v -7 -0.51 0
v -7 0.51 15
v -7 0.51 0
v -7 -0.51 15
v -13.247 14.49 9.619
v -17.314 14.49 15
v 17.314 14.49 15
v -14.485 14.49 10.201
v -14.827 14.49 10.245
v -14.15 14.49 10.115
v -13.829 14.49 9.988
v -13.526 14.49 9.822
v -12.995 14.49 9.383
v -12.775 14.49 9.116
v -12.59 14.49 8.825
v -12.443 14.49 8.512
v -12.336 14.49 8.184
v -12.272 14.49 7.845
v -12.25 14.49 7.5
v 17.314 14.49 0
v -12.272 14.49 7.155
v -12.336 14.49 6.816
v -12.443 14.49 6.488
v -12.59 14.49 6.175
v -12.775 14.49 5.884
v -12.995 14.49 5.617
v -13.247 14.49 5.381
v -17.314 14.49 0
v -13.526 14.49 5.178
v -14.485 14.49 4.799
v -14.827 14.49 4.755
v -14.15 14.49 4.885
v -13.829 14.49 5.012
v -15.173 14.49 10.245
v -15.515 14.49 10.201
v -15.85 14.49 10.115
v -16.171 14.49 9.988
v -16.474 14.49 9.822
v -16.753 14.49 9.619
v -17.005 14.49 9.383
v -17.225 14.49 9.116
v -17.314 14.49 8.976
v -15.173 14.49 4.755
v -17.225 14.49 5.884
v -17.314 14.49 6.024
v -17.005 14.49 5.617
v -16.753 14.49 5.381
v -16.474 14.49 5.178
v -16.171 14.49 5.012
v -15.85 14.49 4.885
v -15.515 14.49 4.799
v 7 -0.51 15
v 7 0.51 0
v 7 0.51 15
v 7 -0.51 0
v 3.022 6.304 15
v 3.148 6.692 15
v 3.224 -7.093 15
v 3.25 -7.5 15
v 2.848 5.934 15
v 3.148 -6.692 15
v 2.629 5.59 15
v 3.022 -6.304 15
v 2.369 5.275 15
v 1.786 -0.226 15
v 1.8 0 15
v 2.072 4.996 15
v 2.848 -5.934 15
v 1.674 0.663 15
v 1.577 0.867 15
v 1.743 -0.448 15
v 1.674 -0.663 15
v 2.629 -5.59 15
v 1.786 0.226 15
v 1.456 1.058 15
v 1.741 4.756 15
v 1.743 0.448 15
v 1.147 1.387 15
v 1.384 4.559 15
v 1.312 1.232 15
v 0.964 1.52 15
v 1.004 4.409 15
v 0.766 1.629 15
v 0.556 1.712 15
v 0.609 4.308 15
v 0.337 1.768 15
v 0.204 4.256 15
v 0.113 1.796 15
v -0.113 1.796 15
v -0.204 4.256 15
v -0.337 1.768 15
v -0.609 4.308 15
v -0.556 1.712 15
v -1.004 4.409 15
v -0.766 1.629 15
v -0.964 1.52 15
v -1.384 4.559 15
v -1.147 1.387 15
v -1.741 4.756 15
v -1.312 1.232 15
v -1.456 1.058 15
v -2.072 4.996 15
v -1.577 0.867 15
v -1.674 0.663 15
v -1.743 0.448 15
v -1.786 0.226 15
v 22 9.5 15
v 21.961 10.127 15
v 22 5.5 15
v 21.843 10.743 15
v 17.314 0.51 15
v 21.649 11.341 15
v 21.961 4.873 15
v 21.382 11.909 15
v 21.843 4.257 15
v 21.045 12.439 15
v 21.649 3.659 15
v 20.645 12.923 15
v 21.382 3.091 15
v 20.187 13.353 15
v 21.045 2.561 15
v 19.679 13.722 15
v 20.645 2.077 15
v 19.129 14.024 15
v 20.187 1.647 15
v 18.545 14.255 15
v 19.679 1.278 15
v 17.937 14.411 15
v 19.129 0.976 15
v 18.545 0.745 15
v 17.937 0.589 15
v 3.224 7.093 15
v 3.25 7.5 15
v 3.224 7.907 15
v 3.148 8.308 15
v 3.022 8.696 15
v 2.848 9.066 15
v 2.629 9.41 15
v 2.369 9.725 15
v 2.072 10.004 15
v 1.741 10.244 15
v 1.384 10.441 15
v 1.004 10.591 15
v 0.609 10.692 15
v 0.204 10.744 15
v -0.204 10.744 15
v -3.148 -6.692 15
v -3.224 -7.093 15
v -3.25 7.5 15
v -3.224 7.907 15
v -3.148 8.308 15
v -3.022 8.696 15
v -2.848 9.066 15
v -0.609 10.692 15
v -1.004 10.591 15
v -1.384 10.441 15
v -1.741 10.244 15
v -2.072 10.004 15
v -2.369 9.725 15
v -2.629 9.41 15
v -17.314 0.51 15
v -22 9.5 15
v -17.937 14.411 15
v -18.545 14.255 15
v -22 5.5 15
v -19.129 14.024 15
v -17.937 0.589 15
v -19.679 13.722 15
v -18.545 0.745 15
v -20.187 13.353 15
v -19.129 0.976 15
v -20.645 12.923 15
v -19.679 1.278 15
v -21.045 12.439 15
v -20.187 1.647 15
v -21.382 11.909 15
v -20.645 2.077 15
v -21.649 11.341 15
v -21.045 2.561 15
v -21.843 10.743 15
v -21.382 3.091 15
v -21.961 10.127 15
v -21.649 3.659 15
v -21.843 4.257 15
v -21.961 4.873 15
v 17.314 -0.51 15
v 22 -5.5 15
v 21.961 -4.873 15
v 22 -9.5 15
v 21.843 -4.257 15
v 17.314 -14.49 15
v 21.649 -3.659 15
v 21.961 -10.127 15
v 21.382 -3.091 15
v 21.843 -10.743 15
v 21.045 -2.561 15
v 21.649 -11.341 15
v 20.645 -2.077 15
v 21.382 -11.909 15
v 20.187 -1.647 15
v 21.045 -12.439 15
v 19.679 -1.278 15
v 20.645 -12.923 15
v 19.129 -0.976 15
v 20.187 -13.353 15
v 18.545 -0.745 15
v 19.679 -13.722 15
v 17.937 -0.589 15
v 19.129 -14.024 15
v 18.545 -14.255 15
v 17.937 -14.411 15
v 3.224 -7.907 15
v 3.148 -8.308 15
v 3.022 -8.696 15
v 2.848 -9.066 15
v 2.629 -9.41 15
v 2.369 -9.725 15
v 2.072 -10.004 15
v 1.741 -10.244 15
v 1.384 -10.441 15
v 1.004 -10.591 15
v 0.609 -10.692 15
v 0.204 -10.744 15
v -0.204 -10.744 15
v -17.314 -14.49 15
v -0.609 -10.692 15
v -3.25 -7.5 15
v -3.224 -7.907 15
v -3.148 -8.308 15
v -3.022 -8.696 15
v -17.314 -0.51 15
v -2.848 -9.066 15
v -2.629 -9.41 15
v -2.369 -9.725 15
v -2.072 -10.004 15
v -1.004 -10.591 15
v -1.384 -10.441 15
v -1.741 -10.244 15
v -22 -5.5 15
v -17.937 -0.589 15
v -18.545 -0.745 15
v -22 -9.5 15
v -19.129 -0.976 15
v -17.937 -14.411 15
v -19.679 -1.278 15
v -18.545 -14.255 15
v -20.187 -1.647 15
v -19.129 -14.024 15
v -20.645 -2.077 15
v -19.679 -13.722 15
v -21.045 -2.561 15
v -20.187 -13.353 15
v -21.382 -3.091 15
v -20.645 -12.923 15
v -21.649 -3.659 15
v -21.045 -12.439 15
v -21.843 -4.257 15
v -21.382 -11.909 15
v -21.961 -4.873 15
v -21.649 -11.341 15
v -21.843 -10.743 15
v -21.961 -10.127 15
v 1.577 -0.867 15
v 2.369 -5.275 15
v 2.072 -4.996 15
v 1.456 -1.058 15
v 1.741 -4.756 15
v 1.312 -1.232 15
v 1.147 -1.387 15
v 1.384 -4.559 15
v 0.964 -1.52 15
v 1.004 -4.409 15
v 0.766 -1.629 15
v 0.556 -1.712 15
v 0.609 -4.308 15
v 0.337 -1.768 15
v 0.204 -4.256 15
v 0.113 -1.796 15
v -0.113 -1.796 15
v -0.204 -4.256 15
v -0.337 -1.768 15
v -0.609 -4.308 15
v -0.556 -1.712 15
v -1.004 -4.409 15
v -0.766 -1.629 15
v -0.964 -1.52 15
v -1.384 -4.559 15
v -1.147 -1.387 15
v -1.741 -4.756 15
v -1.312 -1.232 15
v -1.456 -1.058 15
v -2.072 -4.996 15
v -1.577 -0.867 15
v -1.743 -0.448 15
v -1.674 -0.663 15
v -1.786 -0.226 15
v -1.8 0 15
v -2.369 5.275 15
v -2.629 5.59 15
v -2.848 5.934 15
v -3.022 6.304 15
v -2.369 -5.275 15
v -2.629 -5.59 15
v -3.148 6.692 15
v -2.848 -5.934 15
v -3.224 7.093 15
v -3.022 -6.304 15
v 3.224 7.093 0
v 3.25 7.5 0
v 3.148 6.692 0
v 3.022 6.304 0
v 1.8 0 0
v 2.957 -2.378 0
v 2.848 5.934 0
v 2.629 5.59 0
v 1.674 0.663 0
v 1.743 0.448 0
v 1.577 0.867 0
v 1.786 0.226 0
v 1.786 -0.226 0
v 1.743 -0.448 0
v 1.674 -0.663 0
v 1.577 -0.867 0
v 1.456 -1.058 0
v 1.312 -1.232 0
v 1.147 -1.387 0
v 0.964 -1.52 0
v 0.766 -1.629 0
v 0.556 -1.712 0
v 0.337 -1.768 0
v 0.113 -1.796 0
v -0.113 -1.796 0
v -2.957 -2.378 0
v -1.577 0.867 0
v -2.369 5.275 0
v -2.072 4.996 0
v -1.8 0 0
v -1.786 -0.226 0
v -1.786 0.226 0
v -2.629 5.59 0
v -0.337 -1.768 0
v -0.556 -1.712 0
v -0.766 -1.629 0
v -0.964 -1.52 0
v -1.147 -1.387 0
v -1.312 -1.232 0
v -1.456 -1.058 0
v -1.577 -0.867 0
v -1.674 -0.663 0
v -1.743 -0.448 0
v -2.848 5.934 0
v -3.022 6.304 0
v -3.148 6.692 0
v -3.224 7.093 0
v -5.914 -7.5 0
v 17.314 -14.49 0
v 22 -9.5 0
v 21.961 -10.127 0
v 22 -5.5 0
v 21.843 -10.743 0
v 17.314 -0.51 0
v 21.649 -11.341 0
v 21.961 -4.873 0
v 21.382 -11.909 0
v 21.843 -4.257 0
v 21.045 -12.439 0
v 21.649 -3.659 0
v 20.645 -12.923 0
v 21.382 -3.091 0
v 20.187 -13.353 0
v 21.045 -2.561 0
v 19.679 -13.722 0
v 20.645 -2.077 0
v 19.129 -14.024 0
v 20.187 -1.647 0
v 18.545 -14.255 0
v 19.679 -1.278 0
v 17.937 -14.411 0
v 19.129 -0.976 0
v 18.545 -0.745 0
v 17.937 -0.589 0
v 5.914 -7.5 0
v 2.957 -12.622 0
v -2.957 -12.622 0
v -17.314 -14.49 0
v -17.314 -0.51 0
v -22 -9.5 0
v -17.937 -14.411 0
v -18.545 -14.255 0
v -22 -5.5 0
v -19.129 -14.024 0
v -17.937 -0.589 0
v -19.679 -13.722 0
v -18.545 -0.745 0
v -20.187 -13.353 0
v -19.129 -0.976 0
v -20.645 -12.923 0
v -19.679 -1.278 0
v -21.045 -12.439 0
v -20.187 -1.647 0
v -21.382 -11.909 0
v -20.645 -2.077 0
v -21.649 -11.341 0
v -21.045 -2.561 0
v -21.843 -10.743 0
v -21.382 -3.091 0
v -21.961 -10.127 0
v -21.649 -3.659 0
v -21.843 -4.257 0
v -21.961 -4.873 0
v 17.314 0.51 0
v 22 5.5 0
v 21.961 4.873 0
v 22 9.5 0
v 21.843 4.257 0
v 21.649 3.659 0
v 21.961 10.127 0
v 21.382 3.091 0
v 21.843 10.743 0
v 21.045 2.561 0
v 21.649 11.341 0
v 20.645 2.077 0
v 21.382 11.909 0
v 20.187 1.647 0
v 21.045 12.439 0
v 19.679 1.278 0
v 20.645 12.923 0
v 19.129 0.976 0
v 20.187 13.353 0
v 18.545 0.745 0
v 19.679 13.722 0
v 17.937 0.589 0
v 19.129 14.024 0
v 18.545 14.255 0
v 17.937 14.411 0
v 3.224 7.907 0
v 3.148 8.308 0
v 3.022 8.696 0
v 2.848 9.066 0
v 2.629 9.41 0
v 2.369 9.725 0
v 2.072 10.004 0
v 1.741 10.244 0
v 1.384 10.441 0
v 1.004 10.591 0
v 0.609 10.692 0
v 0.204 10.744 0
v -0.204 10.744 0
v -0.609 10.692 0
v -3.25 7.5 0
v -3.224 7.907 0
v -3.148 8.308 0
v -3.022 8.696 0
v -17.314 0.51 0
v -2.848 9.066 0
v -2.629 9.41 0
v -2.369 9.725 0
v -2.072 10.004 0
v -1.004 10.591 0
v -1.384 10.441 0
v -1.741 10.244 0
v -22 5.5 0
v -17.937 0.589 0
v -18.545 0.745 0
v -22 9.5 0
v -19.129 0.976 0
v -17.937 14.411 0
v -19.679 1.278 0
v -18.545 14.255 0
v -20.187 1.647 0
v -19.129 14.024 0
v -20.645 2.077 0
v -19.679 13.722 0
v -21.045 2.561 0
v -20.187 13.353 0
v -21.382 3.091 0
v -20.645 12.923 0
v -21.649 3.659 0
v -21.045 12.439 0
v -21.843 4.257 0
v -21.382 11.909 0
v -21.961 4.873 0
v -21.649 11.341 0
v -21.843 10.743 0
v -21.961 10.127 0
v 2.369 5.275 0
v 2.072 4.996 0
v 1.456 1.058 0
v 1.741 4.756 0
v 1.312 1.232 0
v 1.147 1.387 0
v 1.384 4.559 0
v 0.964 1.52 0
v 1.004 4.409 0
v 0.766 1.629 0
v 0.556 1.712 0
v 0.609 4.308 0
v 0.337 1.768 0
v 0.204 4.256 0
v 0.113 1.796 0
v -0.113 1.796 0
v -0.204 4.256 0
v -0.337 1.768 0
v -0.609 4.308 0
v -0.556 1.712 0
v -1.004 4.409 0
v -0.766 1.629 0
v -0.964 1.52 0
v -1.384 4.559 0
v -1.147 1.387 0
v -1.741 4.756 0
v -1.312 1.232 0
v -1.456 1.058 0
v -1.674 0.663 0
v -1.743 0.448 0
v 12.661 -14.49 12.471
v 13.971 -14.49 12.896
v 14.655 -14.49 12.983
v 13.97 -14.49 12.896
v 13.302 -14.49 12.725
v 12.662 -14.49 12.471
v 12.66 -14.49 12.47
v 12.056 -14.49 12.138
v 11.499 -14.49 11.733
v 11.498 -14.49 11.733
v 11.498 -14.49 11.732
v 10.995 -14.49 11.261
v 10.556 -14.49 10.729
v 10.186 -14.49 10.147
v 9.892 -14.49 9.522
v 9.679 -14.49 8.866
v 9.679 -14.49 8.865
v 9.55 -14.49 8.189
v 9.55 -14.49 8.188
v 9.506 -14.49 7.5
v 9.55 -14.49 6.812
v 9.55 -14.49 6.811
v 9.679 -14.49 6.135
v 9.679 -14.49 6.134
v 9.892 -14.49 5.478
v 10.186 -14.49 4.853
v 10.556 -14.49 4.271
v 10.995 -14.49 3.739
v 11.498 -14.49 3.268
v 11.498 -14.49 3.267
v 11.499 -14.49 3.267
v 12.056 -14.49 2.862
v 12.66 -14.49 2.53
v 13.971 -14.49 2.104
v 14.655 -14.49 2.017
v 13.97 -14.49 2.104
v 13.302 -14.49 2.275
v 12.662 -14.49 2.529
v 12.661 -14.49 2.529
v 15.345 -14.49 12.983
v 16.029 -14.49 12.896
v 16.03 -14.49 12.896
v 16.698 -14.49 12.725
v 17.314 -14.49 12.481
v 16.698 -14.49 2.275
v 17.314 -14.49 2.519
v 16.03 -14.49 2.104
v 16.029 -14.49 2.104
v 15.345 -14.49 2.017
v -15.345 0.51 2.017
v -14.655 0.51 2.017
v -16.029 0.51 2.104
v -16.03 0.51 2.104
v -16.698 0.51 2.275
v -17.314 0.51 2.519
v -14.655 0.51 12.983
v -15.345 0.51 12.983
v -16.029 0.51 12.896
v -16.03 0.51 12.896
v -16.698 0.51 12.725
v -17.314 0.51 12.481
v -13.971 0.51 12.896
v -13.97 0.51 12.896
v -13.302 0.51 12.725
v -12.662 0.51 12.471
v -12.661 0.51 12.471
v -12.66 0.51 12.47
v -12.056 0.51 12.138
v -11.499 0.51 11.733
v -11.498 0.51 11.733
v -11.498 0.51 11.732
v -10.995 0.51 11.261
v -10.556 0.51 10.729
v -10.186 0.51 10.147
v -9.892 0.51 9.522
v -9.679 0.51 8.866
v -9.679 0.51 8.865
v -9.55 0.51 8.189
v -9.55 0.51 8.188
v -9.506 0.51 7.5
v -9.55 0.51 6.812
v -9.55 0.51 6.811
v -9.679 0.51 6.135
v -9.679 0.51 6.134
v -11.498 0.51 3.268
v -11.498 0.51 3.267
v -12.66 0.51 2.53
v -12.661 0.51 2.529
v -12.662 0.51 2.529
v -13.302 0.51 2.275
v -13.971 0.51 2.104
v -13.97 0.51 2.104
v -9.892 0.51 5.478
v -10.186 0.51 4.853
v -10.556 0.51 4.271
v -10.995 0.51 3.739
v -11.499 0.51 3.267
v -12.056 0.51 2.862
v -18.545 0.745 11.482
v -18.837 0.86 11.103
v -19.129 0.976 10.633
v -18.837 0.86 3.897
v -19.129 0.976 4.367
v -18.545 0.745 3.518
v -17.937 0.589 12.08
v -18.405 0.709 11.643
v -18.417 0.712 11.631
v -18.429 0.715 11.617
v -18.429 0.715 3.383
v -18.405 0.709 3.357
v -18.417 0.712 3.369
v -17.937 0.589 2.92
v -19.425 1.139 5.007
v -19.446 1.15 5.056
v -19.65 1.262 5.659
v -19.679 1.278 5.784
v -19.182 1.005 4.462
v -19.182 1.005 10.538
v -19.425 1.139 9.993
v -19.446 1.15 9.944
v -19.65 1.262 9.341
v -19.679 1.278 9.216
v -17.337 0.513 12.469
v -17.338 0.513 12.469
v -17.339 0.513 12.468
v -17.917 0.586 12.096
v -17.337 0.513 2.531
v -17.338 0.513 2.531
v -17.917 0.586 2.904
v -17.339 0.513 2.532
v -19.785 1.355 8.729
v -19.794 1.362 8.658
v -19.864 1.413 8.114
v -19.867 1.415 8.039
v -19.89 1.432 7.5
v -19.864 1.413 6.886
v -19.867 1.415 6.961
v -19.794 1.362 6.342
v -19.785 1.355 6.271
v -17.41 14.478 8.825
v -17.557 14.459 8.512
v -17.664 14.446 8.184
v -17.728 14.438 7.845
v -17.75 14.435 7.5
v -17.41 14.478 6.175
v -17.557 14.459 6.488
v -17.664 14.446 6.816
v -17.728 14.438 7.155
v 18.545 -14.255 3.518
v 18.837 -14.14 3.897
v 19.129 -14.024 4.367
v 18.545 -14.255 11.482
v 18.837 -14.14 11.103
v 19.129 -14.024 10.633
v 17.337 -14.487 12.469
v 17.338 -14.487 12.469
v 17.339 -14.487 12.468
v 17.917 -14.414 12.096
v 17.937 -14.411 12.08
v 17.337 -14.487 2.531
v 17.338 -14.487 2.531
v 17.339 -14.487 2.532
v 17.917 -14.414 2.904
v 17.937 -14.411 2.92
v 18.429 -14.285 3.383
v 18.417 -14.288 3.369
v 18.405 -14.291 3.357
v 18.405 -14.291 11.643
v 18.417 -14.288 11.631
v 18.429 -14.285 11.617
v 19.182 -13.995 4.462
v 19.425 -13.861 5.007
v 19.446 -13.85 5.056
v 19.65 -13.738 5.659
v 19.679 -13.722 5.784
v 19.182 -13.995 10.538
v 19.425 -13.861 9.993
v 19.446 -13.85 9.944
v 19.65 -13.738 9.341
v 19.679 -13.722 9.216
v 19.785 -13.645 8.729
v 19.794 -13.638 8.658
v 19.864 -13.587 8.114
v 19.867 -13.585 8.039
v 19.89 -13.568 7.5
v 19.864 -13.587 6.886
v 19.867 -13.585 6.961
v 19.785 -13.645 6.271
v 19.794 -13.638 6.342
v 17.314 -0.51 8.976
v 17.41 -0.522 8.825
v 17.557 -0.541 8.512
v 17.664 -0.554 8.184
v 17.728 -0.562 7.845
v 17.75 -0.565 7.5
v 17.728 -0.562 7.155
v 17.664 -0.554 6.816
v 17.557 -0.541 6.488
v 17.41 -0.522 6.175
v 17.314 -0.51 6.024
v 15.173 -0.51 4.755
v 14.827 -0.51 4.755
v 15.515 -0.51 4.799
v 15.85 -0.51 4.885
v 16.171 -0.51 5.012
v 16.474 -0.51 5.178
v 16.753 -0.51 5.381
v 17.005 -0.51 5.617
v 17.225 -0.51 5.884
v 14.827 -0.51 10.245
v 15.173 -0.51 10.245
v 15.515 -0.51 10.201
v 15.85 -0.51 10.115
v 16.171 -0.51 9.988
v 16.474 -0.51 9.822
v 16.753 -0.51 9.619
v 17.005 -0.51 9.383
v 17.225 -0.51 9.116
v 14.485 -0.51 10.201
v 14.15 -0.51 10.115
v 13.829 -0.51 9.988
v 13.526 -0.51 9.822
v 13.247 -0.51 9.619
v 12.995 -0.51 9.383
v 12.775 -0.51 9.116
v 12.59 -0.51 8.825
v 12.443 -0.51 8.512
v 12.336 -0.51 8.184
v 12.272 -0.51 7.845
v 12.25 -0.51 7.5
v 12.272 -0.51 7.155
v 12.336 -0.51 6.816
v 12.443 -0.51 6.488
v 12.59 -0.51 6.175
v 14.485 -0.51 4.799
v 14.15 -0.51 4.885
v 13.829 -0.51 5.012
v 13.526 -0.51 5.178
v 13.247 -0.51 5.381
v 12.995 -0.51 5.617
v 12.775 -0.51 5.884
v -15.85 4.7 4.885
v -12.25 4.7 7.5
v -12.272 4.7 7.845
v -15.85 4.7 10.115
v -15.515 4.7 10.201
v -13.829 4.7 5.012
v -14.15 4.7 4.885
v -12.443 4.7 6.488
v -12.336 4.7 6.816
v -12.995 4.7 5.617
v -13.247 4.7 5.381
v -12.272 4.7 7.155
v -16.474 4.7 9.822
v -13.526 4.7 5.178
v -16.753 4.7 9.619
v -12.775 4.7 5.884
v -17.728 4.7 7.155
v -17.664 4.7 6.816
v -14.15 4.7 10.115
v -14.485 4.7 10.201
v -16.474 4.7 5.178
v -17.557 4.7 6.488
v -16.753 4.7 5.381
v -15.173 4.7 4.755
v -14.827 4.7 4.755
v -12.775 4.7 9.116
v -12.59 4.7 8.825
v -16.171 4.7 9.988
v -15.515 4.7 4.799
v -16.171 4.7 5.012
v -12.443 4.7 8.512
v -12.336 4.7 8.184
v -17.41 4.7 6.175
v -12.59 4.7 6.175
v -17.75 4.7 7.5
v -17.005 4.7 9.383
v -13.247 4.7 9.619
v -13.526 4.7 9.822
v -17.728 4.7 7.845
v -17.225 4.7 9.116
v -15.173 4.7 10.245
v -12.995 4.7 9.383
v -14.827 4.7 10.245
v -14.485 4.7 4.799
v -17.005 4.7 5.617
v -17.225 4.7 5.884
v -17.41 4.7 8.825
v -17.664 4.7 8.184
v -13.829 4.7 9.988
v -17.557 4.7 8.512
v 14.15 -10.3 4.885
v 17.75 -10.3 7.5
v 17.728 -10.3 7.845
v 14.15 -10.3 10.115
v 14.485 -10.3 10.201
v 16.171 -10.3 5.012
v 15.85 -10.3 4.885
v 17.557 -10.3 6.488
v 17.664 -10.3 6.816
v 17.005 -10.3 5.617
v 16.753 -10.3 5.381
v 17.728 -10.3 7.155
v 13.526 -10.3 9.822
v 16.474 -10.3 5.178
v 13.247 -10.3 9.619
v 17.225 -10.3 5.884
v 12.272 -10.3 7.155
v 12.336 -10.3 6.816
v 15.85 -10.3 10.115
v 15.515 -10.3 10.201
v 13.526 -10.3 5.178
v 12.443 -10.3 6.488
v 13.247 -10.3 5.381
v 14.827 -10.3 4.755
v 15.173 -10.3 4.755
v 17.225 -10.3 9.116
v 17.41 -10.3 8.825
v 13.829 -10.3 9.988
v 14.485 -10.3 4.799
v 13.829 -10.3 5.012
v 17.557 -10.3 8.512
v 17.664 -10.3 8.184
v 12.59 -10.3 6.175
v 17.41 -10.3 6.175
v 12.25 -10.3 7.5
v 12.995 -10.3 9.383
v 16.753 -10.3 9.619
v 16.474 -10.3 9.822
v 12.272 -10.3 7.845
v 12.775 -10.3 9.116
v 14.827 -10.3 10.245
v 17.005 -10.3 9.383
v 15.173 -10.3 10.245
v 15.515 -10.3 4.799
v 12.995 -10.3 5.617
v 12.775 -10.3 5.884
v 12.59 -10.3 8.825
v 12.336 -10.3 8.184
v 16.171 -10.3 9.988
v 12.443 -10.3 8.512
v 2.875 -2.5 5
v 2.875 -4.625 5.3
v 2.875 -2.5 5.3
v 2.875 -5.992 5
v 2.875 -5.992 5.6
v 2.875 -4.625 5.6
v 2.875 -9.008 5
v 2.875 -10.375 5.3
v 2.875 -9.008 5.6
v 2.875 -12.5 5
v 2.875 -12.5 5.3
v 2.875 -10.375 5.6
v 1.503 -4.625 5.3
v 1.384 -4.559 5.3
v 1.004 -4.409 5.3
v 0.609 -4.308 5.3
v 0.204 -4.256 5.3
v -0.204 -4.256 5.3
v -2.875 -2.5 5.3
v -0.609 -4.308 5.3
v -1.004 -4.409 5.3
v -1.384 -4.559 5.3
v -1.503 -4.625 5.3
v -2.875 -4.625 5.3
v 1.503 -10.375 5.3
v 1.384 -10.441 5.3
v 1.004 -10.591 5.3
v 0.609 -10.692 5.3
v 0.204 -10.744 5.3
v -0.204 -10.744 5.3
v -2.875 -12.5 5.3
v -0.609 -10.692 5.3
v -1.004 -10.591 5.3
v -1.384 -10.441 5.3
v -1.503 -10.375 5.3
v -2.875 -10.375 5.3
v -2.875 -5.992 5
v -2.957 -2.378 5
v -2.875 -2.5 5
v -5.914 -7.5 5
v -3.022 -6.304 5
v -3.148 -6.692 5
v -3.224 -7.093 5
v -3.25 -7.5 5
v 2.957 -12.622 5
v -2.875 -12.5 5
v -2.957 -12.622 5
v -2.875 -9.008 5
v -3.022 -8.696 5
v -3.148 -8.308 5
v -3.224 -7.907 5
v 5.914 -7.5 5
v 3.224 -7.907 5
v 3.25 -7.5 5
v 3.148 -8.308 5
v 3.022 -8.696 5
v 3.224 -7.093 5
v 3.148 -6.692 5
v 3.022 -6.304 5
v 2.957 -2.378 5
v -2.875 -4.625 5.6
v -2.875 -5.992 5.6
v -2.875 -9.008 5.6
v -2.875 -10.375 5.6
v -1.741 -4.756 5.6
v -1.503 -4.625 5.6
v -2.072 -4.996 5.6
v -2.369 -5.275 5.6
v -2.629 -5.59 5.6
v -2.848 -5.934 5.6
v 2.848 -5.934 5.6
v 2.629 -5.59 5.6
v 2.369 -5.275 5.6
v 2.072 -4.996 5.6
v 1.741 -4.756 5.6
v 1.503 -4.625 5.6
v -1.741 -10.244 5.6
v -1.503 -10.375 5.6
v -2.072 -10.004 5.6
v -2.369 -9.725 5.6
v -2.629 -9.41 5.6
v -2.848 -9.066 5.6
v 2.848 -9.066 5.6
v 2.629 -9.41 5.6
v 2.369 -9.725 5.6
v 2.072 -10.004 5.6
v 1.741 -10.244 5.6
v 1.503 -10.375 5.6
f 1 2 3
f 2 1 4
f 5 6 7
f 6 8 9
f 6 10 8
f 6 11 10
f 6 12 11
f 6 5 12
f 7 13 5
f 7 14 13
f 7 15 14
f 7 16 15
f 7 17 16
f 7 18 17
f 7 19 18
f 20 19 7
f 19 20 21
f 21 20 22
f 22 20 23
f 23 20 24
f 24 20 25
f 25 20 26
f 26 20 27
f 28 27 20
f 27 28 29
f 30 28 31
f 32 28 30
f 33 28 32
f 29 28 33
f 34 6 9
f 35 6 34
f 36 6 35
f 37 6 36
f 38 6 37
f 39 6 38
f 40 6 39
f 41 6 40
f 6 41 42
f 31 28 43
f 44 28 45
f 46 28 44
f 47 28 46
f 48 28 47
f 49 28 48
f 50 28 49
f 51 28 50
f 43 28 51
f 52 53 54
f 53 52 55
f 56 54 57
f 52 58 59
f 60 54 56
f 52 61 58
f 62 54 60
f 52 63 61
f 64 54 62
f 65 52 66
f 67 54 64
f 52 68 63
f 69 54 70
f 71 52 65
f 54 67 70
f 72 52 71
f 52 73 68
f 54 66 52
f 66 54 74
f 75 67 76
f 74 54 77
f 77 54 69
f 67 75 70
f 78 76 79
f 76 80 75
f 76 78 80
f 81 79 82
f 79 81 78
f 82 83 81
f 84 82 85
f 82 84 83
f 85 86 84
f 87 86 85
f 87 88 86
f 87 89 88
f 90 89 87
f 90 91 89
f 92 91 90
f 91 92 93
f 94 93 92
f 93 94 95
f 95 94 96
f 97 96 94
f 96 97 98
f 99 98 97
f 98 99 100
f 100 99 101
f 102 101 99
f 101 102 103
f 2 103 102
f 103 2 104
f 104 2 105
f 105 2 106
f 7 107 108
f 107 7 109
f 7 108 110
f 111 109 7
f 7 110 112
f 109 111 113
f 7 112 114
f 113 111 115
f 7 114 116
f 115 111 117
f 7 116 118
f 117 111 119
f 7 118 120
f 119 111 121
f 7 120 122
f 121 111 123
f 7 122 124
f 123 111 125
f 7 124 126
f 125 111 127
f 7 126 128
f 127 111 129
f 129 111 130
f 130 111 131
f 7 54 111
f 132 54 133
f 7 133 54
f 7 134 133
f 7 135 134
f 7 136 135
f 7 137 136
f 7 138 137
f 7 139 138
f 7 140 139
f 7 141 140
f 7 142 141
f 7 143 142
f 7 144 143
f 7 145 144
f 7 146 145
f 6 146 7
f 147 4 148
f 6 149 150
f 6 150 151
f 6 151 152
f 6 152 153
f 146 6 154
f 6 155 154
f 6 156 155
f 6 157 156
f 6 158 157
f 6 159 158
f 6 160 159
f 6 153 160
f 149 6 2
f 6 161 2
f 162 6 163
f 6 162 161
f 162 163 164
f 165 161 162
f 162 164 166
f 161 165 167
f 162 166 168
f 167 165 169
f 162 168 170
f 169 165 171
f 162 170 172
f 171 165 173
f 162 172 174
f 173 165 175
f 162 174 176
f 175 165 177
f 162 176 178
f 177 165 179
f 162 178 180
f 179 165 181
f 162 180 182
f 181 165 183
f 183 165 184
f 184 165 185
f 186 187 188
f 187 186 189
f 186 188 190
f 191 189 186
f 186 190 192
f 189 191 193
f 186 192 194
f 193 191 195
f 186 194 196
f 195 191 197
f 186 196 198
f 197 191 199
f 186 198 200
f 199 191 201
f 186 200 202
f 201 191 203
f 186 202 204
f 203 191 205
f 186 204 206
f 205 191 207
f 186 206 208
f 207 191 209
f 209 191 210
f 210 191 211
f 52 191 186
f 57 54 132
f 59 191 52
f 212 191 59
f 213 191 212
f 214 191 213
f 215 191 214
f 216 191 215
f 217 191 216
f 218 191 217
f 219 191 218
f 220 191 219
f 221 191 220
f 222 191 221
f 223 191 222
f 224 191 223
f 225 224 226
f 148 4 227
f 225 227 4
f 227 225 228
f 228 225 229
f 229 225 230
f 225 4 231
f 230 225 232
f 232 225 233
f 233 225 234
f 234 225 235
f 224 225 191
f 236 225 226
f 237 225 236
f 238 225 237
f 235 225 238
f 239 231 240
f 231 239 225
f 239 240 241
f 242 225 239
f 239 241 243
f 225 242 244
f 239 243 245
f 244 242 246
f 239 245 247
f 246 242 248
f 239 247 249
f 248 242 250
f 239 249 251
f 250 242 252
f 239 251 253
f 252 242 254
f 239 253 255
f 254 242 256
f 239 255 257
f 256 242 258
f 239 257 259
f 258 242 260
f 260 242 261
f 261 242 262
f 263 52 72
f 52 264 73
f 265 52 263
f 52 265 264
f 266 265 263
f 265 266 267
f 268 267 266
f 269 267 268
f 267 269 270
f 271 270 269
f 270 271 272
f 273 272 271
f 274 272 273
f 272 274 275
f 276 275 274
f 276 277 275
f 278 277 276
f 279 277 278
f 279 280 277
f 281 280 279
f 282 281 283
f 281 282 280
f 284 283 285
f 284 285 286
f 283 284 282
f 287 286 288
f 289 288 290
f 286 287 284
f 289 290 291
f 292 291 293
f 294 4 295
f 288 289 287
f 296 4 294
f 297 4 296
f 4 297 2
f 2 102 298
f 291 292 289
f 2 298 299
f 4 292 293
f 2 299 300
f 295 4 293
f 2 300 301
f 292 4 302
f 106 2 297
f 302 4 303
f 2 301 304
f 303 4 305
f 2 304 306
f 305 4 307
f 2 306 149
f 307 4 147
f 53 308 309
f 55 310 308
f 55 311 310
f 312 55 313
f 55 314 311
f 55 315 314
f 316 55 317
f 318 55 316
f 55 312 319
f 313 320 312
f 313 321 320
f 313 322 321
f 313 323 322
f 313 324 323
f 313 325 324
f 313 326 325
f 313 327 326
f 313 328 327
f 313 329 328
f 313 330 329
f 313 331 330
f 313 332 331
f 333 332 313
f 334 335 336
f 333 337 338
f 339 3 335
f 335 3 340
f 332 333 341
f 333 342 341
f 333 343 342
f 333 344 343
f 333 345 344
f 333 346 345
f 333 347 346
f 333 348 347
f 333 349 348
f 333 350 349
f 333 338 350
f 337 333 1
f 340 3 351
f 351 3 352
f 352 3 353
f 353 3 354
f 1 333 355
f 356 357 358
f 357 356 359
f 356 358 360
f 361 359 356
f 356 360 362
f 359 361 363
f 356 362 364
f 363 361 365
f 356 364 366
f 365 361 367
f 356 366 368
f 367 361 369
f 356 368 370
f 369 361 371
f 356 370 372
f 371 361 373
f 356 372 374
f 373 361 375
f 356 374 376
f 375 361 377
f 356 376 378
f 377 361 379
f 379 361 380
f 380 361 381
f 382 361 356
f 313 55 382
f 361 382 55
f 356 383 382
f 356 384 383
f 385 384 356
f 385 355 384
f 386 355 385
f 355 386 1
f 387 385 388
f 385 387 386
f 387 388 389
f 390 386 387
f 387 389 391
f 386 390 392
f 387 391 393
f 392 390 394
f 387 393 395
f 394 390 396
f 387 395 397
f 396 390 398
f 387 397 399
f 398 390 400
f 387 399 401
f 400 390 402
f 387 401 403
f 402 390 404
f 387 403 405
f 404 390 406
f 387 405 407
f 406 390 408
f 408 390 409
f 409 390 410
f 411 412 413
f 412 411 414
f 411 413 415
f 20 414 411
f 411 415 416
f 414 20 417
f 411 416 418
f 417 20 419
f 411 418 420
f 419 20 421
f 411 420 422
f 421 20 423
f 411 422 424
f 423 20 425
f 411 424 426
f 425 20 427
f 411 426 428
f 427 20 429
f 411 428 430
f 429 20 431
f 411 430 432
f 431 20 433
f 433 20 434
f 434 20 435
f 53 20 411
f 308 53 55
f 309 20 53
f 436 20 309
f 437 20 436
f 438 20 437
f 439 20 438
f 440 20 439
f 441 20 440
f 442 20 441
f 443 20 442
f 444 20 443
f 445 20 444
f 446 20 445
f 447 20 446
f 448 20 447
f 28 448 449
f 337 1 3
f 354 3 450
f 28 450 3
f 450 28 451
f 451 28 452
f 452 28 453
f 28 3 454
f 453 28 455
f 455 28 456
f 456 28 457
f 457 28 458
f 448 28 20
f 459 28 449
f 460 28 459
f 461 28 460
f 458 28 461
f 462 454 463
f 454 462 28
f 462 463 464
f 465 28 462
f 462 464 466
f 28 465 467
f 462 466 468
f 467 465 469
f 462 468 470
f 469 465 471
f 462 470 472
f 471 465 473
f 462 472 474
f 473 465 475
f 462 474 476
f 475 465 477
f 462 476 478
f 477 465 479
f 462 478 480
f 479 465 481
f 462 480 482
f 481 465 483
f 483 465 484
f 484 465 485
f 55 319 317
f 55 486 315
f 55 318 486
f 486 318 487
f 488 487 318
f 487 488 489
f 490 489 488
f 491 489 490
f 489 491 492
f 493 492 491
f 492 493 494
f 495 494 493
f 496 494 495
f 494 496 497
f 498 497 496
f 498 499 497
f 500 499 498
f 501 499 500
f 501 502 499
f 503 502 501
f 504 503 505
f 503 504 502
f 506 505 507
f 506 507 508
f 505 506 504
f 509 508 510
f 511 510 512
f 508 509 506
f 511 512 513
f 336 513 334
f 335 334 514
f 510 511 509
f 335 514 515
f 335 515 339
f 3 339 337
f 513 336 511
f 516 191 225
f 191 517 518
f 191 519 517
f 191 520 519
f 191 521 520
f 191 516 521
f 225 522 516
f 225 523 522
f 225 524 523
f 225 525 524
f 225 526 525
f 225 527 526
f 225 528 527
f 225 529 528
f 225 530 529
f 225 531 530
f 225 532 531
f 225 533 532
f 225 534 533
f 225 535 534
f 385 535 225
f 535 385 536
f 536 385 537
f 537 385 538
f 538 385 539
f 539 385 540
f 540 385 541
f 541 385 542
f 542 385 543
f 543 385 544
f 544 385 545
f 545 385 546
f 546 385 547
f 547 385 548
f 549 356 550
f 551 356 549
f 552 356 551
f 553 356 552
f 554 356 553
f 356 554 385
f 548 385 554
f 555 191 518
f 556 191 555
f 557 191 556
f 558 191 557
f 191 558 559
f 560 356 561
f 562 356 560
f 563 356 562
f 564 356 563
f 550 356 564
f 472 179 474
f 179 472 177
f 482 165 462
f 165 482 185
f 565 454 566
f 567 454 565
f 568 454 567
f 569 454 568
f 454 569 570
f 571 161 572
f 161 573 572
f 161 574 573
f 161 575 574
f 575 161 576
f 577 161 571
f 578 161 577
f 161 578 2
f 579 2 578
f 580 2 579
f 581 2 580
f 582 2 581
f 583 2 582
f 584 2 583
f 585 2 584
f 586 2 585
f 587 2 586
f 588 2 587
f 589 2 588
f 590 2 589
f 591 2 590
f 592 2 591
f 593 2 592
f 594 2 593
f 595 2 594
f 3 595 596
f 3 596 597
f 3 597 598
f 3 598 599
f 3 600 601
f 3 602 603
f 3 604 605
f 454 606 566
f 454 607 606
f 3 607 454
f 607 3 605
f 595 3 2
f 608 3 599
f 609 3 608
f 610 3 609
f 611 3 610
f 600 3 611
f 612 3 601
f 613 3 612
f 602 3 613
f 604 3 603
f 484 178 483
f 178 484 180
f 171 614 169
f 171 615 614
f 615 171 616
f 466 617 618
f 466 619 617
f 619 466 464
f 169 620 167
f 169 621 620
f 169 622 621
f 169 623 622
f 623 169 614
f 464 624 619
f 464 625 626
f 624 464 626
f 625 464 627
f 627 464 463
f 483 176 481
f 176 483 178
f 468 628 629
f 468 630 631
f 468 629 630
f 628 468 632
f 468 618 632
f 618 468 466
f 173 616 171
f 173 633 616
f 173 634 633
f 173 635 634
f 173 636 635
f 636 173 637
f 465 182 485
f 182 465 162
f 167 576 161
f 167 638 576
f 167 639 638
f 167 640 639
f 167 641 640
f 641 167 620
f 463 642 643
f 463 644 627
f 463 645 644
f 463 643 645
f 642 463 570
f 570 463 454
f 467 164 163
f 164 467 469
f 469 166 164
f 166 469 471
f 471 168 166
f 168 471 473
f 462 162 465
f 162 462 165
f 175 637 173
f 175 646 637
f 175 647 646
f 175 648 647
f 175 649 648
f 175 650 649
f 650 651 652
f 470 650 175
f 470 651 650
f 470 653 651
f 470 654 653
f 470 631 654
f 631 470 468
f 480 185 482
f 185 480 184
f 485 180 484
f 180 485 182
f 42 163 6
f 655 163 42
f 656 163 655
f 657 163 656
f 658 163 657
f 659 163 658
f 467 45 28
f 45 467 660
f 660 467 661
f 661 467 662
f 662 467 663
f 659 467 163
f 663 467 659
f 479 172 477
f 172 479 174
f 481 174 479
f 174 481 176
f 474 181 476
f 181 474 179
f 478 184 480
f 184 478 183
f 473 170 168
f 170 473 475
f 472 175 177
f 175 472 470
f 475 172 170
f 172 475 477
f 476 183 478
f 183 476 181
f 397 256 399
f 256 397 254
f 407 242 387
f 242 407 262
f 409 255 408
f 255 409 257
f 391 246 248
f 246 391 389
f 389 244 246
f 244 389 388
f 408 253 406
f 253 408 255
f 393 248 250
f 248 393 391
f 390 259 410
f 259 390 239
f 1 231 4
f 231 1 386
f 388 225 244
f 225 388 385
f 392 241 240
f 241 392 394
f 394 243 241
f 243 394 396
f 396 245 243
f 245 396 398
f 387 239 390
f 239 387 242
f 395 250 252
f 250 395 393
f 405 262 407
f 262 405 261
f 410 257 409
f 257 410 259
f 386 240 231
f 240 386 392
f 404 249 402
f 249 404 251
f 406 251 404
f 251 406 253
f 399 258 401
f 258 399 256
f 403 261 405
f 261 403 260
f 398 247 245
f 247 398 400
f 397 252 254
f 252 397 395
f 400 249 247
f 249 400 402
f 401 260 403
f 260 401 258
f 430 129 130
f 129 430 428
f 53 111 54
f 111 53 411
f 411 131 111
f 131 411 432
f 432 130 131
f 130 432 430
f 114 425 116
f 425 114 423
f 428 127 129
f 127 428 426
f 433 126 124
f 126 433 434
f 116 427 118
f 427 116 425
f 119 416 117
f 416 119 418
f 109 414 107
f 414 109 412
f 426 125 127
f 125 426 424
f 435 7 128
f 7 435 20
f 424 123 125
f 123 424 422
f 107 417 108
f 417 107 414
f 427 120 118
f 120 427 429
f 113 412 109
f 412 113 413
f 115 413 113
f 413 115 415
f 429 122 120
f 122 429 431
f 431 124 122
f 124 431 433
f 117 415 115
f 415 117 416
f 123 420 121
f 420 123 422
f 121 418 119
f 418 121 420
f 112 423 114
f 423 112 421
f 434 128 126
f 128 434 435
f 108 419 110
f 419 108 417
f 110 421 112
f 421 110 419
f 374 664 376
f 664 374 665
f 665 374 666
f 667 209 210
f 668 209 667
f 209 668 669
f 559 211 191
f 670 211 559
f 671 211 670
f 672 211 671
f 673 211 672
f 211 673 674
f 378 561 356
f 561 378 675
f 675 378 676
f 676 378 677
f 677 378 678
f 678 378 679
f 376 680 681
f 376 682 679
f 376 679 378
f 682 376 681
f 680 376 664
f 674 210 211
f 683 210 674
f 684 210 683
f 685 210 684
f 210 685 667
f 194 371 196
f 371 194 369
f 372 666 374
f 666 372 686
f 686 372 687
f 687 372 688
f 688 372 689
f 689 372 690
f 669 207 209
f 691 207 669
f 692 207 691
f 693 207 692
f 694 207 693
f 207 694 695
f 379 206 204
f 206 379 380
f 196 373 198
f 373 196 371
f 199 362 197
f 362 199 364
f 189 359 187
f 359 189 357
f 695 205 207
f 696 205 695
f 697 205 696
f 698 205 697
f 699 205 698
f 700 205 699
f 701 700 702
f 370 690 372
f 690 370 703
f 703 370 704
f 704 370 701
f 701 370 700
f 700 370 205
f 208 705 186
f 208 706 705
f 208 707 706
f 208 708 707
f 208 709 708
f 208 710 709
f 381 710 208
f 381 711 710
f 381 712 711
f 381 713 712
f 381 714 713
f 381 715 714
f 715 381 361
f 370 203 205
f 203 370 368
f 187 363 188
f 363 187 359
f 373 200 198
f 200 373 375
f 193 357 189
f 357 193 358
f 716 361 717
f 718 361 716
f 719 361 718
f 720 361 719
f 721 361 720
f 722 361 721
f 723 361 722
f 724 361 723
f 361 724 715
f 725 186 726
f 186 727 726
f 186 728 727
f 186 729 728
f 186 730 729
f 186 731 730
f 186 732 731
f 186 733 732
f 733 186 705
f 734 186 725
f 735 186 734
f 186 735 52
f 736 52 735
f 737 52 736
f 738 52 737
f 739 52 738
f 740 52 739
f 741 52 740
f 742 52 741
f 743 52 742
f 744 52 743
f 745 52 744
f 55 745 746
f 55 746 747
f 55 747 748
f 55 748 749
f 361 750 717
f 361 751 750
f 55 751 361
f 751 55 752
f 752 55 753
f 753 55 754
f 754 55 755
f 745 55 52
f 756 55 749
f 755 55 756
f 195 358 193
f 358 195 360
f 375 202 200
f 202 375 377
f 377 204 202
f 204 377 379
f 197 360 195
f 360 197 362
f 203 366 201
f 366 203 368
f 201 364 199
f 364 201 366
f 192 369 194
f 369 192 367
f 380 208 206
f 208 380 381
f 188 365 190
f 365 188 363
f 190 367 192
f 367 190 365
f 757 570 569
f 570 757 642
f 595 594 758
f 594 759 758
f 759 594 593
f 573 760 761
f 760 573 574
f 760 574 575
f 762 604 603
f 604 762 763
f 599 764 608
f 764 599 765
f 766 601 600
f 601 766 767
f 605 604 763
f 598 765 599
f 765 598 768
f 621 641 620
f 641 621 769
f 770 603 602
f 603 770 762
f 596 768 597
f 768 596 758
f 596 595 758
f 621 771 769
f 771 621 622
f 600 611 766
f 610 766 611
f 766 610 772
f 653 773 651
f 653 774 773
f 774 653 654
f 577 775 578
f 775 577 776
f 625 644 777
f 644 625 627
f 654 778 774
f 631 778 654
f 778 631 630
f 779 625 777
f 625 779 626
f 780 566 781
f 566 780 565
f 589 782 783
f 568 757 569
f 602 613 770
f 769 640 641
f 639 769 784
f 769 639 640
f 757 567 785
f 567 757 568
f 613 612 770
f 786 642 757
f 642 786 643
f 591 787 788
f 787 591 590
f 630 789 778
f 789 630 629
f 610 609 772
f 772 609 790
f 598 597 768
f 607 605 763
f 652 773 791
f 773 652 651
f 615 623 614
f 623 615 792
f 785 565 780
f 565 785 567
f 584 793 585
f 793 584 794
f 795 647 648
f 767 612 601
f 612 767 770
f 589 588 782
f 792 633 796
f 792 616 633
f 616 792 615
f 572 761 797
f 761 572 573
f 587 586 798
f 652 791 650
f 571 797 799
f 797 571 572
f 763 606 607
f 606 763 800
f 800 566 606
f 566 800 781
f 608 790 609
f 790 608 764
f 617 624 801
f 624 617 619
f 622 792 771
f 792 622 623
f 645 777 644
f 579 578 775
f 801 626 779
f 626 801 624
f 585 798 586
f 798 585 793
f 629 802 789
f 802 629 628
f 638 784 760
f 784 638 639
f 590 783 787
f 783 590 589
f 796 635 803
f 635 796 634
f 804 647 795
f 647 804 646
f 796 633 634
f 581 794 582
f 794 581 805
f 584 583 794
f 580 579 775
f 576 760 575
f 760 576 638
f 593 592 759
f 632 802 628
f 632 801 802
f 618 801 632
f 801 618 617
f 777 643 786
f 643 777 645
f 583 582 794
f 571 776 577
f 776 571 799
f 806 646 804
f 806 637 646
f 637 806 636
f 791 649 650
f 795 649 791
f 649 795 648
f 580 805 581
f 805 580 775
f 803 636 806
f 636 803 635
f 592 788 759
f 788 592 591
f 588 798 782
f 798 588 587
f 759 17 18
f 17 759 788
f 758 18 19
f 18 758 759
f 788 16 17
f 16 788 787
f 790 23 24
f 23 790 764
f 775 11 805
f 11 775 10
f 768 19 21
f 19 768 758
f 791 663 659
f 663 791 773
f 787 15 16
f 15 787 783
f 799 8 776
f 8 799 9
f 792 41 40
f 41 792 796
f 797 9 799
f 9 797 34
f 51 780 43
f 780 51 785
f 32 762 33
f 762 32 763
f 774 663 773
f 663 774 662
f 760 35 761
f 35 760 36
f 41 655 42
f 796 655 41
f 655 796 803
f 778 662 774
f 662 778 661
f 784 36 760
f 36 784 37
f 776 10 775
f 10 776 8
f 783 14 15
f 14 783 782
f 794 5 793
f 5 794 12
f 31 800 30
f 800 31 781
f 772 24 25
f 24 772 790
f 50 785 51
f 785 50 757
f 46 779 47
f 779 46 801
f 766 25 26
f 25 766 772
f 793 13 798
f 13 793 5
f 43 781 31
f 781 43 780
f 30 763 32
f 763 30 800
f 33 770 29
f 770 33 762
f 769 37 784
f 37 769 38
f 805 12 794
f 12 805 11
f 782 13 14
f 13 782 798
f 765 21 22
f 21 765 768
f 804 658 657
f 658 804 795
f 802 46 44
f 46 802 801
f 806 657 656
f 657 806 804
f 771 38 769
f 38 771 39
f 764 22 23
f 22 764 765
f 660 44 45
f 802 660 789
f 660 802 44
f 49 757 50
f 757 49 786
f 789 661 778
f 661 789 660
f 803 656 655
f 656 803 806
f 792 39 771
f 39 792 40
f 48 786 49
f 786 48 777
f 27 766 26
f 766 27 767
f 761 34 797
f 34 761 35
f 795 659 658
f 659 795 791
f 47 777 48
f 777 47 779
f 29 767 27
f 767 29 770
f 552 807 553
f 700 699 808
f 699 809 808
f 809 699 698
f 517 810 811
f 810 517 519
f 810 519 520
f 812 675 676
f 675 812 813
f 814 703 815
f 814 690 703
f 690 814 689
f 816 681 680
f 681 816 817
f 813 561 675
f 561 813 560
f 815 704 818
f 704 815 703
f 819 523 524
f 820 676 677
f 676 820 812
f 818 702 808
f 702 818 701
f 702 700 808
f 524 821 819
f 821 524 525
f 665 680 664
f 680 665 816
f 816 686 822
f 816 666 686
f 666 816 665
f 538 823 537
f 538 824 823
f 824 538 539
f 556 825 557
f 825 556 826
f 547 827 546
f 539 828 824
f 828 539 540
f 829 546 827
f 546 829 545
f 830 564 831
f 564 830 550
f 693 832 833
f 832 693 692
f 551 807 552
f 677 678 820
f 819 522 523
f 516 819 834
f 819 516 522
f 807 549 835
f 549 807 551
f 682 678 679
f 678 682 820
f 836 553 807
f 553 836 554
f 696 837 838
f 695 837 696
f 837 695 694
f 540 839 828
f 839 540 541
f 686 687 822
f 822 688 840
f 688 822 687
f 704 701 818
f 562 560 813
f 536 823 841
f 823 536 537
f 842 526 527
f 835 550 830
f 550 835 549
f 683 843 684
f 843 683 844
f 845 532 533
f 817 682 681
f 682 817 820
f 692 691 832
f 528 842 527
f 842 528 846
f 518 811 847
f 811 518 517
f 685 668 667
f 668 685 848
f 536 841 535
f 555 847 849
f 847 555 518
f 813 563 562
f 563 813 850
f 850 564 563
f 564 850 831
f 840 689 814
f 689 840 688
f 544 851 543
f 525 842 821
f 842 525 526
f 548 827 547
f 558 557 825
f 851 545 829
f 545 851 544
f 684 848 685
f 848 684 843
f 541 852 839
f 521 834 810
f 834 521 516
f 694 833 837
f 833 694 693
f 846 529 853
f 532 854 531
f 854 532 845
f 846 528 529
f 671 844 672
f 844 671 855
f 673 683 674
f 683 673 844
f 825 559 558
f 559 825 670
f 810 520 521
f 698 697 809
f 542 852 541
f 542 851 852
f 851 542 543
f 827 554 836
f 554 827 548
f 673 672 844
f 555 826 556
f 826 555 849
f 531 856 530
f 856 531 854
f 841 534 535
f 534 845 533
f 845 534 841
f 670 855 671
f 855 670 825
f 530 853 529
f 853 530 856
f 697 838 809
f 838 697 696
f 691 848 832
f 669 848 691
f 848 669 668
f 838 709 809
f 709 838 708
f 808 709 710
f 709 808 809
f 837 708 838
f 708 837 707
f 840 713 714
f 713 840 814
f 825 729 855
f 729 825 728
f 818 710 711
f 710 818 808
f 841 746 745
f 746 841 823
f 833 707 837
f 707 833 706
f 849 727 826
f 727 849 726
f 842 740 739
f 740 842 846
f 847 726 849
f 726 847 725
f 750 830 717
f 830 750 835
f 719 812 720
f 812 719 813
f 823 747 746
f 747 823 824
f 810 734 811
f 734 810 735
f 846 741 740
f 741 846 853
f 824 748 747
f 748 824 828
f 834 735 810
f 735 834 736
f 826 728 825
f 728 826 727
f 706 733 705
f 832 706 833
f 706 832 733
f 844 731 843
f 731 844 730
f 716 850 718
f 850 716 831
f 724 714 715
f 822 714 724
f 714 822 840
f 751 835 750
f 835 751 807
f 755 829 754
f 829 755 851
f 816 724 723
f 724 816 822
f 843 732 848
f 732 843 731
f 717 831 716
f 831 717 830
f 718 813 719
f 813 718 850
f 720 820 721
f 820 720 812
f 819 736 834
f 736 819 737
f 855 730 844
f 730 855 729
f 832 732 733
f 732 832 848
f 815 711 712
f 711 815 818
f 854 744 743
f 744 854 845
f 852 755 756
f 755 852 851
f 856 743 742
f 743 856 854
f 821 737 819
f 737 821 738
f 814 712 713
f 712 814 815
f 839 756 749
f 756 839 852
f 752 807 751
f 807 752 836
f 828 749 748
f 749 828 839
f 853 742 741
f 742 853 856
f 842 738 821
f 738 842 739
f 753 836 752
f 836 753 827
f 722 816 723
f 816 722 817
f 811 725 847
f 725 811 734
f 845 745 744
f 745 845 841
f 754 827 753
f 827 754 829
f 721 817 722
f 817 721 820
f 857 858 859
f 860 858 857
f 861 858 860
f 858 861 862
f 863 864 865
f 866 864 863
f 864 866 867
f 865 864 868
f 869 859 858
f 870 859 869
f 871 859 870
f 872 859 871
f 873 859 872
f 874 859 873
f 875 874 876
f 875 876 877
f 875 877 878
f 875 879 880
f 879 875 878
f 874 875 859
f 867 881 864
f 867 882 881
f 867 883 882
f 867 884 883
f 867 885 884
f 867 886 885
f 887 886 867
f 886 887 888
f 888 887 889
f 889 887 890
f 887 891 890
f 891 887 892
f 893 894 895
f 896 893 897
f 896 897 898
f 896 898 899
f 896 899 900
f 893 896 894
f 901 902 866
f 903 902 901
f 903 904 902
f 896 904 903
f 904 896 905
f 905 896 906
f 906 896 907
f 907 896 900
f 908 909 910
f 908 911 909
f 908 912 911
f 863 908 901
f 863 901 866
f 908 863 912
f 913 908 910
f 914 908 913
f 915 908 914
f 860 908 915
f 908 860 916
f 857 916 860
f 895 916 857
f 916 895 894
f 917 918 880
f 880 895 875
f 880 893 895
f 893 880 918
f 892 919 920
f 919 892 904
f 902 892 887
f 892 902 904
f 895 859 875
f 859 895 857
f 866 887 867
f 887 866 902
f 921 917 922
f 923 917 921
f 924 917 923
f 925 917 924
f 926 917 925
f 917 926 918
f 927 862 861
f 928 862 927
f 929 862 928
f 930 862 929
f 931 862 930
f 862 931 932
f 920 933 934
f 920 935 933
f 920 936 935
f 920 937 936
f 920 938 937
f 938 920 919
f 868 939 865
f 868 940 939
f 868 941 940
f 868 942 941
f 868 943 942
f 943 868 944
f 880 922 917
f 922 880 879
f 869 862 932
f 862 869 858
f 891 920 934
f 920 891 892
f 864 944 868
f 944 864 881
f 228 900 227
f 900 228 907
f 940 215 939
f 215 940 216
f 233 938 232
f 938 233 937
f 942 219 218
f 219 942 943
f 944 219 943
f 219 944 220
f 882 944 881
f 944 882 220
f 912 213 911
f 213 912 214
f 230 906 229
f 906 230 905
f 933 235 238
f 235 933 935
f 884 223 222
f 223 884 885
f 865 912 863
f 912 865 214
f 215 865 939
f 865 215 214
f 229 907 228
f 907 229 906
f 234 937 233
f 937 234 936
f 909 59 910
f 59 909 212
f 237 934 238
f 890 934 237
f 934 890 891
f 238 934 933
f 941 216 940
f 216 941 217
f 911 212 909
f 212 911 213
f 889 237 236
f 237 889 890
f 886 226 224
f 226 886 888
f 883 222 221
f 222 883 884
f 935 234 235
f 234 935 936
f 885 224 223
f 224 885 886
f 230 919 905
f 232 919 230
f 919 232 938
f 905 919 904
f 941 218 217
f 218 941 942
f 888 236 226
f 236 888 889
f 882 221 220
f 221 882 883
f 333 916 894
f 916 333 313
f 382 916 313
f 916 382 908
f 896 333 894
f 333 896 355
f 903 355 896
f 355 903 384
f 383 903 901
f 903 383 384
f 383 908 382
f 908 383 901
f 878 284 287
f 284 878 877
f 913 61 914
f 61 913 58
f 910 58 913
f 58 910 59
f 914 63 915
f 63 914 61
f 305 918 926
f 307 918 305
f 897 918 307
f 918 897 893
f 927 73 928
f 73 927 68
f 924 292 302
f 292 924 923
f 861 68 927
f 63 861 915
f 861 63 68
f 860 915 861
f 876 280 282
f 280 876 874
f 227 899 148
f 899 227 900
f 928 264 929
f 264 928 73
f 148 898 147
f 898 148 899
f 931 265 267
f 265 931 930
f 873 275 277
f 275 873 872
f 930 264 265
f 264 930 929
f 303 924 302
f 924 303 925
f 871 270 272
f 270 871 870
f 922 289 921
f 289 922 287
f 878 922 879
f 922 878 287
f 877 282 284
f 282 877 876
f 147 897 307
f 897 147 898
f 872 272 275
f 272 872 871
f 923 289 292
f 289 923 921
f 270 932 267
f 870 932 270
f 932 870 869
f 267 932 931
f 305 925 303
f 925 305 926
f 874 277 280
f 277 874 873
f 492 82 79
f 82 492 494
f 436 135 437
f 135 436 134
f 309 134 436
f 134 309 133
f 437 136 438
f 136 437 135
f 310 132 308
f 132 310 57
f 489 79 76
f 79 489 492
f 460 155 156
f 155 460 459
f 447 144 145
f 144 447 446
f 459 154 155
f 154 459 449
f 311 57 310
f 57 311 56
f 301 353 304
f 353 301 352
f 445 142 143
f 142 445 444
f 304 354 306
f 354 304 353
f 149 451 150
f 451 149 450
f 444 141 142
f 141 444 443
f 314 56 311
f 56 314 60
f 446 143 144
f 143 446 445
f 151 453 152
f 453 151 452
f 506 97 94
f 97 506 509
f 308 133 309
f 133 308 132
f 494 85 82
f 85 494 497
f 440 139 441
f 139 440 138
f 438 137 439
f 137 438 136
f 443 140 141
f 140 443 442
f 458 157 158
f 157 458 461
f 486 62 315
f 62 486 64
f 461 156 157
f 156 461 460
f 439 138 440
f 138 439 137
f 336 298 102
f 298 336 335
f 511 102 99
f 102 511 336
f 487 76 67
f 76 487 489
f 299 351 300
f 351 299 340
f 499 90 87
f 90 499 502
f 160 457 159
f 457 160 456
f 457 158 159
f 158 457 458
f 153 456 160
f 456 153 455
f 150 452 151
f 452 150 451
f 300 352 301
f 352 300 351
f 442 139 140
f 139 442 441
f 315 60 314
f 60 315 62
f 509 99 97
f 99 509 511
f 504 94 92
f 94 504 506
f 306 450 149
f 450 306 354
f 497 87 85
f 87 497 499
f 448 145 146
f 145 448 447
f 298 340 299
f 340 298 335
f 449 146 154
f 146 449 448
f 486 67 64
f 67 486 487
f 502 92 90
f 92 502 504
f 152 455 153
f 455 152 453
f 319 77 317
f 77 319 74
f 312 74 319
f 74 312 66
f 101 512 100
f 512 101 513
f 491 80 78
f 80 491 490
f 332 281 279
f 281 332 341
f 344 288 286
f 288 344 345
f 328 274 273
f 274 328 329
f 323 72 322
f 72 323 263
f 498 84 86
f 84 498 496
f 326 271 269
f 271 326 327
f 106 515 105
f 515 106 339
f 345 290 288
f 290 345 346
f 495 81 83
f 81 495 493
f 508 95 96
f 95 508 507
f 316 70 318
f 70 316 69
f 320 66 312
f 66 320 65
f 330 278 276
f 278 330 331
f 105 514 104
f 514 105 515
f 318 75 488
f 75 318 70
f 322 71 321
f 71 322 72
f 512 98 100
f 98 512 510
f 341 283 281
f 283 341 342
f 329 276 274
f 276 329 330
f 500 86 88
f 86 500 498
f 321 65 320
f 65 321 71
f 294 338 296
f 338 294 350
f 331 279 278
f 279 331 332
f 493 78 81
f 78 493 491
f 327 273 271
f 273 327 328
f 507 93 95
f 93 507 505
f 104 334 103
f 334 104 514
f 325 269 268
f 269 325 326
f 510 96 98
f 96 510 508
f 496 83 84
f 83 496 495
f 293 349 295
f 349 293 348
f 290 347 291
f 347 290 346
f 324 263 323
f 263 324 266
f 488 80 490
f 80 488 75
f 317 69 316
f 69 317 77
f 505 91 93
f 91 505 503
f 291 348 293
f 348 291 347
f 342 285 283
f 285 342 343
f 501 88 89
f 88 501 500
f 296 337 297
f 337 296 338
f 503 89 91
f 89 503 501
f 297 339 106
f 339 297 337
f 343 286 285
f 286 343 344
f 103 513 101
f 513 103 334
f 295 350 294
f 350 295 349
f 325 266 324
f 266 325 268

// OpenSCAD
$fn = 50;


difference() {
	union() {
		hull() {
			translate(v = [-2.0000000000, 9.5000000000, 0]) {
				cylinder(h = 15, r = 5);
			}
			translate(v = [2.0000000000, 9.5000000000, 0]) {
				cylinder(h = 15, r = 5);
			}
			translate(v = [-2.0000000000, -9.5000000000, 0]) {
				cylinder(h = 15, r = 5);
			}
			translate(v = [2.0000000000, -9.5000000000, 0]) {
				cylinder(h = 15, r = 5);
			}
		}
		translate(v = [-7.5000000000, 7.5000000000, 0]) {
			hull() {
				translate(v = [-9.5000000000, 2.0000000000, 0]) {
					cylinder(h = 15, r = 5);
				}
				translate(v = [9.5000000000, 2.0000000000, 0]) {
					cylinder(h = 15, r = 5);
				}
				translate(v = [-9.5000000000, -2.0000000000, 0]) {
					cylinder(h = 15, r = 5);
				}
				translate(v = [9.5000000000, -2.0000000000, 0]) {
					cylinder(h = 15, r = 5);
				}
			}
		}
		translate(v = [-7.5000000000, -7.5000000000, 0]) {
			hull() {
				translate(v = [-9.5000000000, 2.0000000000, 0]) {
					cylinder(h = 15, r = 5);
				}
				translate(v = [9.5000000000, 2.0000000000, 0]) {
					cylinder(h = 15, r = 5);
				}
				translate(v = [-9.5000000000, -2.0000000000, 0]) {
					cylinder(h = 15, r = 5);
				}
				translate(v = [9.5000000000, -2.0000000000, 0]) {
					cylinder(h = 15, r = 5);
				}
			}
		}
		translate(v = [7.5000000000, 7.5000000000, 0]) {
			hull() {
				translate(v = [-9.5000000000, 2.0000000000, 0]) {
					cylinder(h = 15, r = 5);
				}
				translate(v = [9.5000000000, 2.0000000000, 0]) {
					cylinder(h = 15, r = 5);
				}
				translate(v = [-9.5000000000, -2.0000000000, 0]) {
					cylinder(h = 15, r = 5);
				}
				translate(v = [9.5000000000, -2.0000000000, 0]) {
					cylinder(h = 15, r = 5);
				}
			}
		}
		translate(v = [7.5000000000, -7.5000000000, 0]) {
			hull() {
				translate(v = [-9.5000000000, 2.0000000000, 0]) {
					cylinder(h = 15, r = 5);
				}
				translate(v = [9.5000000000, 2.0000000000, 0]) {
					cylinder(h = 15, r = 5);
				}
				translate(v = [-9.5000000000, -2.0000000000, 0]) {
					cylinder(h = 15, r = 5);
				}
				translate(v = [9.5000000000, -2.0000000000, 0]) {
					cylinder(h = 15, r = 5);
				}
			}
		}
	}
	union() {
		translate(v = [-15.0000000000, 0.5000000000, 7.5000000000]) {
			rotate(a = [90, 0, 0]) {
				difference() {
					union() {
						#translate(v = [0, 0, -14.0000000000]) {
							cylinder(h = 14, r = 2.2500000000);
						}
						#translate(v = [0, 0, -4.2000000000]) {
							cylinder(h = 4.2000000000, r1 = 2.7500000000, r2 = 5.5000000000);
						}
						#translate(v = [0, 0, -14.0000000000]) {
							cylinder(h = 14, r = 2.7500000000);
						}
						#translate(v = [0, 0, -14.0000000000]) {
							cylinder(h = 14, r = 2.2500000000);
						}
					}
					union();
				}
			}
		}
		translate(v = [15.0000000000, -14.5000000000, 7.5000000000]) {
			rotate(a = [90, 0, 0]) {
				difference() {
					union() {
						#translate(v = [0, 0, -14.0000000000]) {
							cylinder(h = 14, r = 2.2500000000);
						}
						#translate(v = [0, 0, -4.2000000000]) {
							cylinder(h = 4.2000000000, r1 = 2.7500000000, r2 = 5.5000000000);
						}
						#translate(v = [0, 0, -14.0000000000]) {
							cylinder(h = 14, r = 2.7500000000);
						}
						#translate(v = [0, 0, -14.0000000000]) {
							cylinder(h = 14, r = 2.2500000000);
						}
					}
					union();
				}
			}
		}
		translate(v = [0.0000000000, -7.5000000000, 0]) {
			rotate(a = [0, 0, 0]) {
				difference() {
					union() {
						#translate(v = [-2.8750000000, -5.0000000000, -0.3000000000]) {
							cube(size = [5.7500000000, 10, 0.3000000000]);
						}
						#translate(v = [-2.8750000000, -2.8750000000, -0.6000000000]) {
							cube(size = [5.7500000000, 5.7500000000, 0.3000000000]);
						}
						#translate(v = [-2.8750000000, -5.0000000000, 5]) {
							cube(size = [5.7500000000, 10, 0.3000000000]);
						}
						#translate(v = [-2.8750000000, -2.8750000000, 5.3000000000]) {
							cube(size = [5.7500000000, 5.7500000000, 0.3000000000]);
						}
						#translate(v = [0, 0, -100.0000000000]) {
							cylinder(h = 200, r = 3.2500000000);
						}
						#linear_extrude(height = 5) {
							polygon(points = [[5.9142500000, 0.0000000000], [2.9571250000, 5.1218907443], [-2.9571250000, 5.1218907443], [-5.9142500000, 0.0000000000], [-2.9571250000, -5.1218907443], [2.9571250000, -5.1218907443]]);
						}
						#translate(v = [-2.8750000000, -5.0000000000, -0.3000000000]) {
							cube(size = [5.7500000000, 10, 0.3000000000]);
						}
						#translate(v = [-2.8750000000, -2.8750000000, -0.6000000000]) {
							cube(size = [5.7500000000, 5.7500000000, 0.3000000000]);
						}
						#translate(v = [-2.8750000000, -5.0000000000, 5]) {
							cube(size = [5.7500000000, 10, 0.3000000000]);
						}
						#translate(v = [-2.8750000000, -2.8750000000, 5.3000000000]) {
							cube(size = [5.7500000000, 5.7500000000, 0.3000000000]);
						}
						#translate(v = [0, 0, -100.0000000000]) {
							cylinder(h = 200, r = 3.2500000000);
						}
						#translate(v = [-2.8750000000, -5.0000000000, -0.3000000000]) {
							cube(size = [5.7500000000, 10, 0.3000000000]);
						}
						#translate(v = [-2.8750000000, -2.8750000000, -0.6000000000]) {
							cube(size = [5.7500000000, 5.7500000000, 0.3000000000]);
						}
						#translate(v = [-2.8750000000, -5.0000000000, 5]) {
							cube(size = [5.7500000000, 10, 0.3000000000]);
						}
						#translate(v = [-2.8750000000, -2.8750000000, 5.3000000000]) {
							cube(size = [5.7500000000, 5.7500000000, 0.3000000000]);
						}
						#translate(v = [0, 0, -100.0000000000]) {
							cylinder(h = 200, r = 3.2500000000);
						}
					}
					union();
				}
			}
		}
		translate(v = [0.0000000000, -7.5000000000, 0]) {
			translate(v = [0, 0, -100]) {
				cylinder(h = 200, r = 3.2500000000);
			}
		}
		translate(v = [0.0000000000, 7.5000000000, 0]) {
			translate(v = [0, 0, -100]) {
				cylinder(h = 200, r = 3.2500000000);
			}
		}
		translate(v = [0.0000000000, -7.5000000000, 0]) {
			translate(v = [0, 0, -100]) {
				cylinder(h = 200, r = 1.8000000000);
			}
		}
		translate(v = [0, 0, -100]) {
			cylinder(h = 200, r = 1.8000000000);
		}
		translate(v = [0.0000000000, 7.5000000000, 0]) {
			translate(v = [0, 0, -100]) {
				cylinder(h = 200, r = 1.8000000000);
			}
		}
	}
}
